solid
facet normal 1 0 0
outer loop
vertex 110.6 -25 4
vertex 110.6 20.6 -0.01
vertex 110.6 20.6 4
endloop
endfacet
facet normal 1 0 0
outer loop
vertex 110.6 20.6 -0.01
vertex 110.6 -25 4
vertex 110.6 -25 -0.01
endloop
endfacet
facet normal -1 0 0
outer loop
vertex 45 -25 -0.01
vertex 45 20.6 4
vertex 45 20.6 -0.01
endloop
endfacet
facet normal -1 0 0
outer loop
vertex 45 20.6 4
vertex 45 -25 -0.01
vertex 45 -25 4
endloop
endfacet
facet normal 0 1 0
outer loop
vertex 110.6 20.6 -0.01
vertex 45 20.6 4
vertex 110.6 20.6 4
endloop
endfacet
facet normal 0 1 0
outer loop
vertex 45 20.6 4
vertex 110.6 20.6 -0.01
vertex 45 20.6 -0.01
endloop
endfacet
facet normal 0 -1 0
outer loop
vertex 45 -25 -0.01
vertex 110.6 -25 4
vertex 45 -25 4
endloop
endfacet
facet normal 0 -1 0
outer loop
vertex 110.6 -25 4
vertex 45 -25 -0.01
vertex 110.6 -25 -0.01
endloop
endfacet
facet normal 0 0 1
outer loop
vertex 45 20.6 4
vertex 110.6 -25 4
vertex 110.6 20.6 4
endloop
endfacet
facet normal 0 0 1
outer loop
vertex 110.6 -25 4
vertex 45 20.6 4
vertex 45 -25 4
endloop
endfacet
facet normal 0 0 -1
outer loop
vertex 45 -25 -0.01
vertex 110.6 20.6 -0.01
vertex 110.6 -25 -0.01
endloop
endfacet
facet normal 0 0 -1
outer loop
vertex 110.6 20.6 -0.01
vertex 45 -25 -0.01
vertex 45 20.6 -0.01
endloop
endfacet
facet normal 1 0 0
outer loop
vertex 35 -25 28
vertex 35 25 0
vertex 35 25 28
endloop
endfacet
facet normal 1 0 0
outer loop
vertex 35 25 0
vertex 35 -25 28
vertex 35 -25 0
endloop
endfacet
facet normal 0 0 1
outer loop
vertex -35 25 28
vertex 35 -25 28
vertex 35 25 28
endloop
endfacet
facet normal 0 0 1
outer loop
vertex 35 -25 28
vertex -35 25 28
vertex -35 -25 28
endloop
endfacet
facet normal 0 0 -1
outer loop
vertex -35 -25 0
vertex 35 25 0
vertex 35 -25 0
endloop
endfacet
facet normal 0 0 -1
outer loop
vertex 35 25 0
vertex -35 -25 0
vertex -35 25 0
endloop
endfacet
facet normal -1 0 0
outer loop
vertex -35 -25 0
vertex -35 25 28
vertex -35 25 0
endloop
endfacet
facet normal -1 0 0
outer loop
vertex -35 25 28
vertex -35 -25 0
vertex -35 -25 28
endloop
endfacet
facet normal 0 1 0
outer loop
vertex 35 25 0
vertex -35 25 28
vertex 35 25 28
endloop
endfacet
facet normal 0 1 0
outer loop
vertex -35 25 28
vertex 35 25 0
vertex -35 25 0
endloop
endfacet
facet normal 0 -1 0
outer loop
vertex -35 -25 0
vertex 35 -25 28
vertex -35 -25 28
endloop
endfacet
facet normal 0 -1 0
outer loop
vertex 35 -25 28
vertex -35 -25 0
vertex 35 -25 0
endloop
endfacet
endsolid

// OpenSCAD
// Two-part enclosure for a small electronics board (e.g. Arduino-based temperature logger)
// Print orientation: both parts flat on the bed (XY plane), building up in +Z.
// The lid is printed upside down, so its lip faces upward and slides into the box opening.

// ---------------- Parameters ----------------
box_x        = 70;    // box outer size in X (mm)
box_y        = 50;    // box outer size in Y (mm)
box_z        = 30;    // box outer size in Z (mm)
box_wall     = 2;     // box wall thickness (mm)
box_floor    = 2;     // box floor thickness (mm)

lip_x        = 65.6;  // lip outer size in X (mm)
lip_y        = 45.6;  // lip outer size in Y (mm)
lip_t        = 1.5;   // lip wall thickness (mm)
lip_h        = 4;     // lip height above plate (mm)

eps          = 0.5;   // cutter overshoot past faces (mm)
gap          = 10;    // gap between box and lid on the bed (mm)

$fn = 64;

// ---------------- Derived ----------------
box_inner_x = box_x - 2 * box_wall;   // 66 mm
box_inner_y = box_y - 2 * box_wall;   // 46 mm
box_h       = box_z - box_floor;      // 28 mm (open top)

lip_x2      = lip_x - 2 * box_wall;   // 61.6 mm (inner opening in X)
lip_y2      = lip_y - 2 * box_wall;   // 41.6 mm (inner opening in Y)

// ---------------- Model ----------------
union() {
    // Part 1: Box, centred in X and Y, sitting on z = 0
    translate([-box_x / 2, -box_y / 2, 0])
        cube([box_x, box_y, box_h]);

    // Part 2: Lid plate with a rectangular lip on top, centred on the plate
    translate([box_x / 2 + gap, -box_y / 2, 0])
        union() {
            // Base plate, 2 mm thick
            cube([lip_x, lip_y, 2]);

            // Lip: 1.5 mm wall, 4 mm tall, outer size 65.6 x 45.6 mm
            // (overlaps the plate slightly so the union is one solid)
            translate([0, 0, -0.01])
                cube([lip_x, lip_y, lip_h + 0.01]);
        }
}
